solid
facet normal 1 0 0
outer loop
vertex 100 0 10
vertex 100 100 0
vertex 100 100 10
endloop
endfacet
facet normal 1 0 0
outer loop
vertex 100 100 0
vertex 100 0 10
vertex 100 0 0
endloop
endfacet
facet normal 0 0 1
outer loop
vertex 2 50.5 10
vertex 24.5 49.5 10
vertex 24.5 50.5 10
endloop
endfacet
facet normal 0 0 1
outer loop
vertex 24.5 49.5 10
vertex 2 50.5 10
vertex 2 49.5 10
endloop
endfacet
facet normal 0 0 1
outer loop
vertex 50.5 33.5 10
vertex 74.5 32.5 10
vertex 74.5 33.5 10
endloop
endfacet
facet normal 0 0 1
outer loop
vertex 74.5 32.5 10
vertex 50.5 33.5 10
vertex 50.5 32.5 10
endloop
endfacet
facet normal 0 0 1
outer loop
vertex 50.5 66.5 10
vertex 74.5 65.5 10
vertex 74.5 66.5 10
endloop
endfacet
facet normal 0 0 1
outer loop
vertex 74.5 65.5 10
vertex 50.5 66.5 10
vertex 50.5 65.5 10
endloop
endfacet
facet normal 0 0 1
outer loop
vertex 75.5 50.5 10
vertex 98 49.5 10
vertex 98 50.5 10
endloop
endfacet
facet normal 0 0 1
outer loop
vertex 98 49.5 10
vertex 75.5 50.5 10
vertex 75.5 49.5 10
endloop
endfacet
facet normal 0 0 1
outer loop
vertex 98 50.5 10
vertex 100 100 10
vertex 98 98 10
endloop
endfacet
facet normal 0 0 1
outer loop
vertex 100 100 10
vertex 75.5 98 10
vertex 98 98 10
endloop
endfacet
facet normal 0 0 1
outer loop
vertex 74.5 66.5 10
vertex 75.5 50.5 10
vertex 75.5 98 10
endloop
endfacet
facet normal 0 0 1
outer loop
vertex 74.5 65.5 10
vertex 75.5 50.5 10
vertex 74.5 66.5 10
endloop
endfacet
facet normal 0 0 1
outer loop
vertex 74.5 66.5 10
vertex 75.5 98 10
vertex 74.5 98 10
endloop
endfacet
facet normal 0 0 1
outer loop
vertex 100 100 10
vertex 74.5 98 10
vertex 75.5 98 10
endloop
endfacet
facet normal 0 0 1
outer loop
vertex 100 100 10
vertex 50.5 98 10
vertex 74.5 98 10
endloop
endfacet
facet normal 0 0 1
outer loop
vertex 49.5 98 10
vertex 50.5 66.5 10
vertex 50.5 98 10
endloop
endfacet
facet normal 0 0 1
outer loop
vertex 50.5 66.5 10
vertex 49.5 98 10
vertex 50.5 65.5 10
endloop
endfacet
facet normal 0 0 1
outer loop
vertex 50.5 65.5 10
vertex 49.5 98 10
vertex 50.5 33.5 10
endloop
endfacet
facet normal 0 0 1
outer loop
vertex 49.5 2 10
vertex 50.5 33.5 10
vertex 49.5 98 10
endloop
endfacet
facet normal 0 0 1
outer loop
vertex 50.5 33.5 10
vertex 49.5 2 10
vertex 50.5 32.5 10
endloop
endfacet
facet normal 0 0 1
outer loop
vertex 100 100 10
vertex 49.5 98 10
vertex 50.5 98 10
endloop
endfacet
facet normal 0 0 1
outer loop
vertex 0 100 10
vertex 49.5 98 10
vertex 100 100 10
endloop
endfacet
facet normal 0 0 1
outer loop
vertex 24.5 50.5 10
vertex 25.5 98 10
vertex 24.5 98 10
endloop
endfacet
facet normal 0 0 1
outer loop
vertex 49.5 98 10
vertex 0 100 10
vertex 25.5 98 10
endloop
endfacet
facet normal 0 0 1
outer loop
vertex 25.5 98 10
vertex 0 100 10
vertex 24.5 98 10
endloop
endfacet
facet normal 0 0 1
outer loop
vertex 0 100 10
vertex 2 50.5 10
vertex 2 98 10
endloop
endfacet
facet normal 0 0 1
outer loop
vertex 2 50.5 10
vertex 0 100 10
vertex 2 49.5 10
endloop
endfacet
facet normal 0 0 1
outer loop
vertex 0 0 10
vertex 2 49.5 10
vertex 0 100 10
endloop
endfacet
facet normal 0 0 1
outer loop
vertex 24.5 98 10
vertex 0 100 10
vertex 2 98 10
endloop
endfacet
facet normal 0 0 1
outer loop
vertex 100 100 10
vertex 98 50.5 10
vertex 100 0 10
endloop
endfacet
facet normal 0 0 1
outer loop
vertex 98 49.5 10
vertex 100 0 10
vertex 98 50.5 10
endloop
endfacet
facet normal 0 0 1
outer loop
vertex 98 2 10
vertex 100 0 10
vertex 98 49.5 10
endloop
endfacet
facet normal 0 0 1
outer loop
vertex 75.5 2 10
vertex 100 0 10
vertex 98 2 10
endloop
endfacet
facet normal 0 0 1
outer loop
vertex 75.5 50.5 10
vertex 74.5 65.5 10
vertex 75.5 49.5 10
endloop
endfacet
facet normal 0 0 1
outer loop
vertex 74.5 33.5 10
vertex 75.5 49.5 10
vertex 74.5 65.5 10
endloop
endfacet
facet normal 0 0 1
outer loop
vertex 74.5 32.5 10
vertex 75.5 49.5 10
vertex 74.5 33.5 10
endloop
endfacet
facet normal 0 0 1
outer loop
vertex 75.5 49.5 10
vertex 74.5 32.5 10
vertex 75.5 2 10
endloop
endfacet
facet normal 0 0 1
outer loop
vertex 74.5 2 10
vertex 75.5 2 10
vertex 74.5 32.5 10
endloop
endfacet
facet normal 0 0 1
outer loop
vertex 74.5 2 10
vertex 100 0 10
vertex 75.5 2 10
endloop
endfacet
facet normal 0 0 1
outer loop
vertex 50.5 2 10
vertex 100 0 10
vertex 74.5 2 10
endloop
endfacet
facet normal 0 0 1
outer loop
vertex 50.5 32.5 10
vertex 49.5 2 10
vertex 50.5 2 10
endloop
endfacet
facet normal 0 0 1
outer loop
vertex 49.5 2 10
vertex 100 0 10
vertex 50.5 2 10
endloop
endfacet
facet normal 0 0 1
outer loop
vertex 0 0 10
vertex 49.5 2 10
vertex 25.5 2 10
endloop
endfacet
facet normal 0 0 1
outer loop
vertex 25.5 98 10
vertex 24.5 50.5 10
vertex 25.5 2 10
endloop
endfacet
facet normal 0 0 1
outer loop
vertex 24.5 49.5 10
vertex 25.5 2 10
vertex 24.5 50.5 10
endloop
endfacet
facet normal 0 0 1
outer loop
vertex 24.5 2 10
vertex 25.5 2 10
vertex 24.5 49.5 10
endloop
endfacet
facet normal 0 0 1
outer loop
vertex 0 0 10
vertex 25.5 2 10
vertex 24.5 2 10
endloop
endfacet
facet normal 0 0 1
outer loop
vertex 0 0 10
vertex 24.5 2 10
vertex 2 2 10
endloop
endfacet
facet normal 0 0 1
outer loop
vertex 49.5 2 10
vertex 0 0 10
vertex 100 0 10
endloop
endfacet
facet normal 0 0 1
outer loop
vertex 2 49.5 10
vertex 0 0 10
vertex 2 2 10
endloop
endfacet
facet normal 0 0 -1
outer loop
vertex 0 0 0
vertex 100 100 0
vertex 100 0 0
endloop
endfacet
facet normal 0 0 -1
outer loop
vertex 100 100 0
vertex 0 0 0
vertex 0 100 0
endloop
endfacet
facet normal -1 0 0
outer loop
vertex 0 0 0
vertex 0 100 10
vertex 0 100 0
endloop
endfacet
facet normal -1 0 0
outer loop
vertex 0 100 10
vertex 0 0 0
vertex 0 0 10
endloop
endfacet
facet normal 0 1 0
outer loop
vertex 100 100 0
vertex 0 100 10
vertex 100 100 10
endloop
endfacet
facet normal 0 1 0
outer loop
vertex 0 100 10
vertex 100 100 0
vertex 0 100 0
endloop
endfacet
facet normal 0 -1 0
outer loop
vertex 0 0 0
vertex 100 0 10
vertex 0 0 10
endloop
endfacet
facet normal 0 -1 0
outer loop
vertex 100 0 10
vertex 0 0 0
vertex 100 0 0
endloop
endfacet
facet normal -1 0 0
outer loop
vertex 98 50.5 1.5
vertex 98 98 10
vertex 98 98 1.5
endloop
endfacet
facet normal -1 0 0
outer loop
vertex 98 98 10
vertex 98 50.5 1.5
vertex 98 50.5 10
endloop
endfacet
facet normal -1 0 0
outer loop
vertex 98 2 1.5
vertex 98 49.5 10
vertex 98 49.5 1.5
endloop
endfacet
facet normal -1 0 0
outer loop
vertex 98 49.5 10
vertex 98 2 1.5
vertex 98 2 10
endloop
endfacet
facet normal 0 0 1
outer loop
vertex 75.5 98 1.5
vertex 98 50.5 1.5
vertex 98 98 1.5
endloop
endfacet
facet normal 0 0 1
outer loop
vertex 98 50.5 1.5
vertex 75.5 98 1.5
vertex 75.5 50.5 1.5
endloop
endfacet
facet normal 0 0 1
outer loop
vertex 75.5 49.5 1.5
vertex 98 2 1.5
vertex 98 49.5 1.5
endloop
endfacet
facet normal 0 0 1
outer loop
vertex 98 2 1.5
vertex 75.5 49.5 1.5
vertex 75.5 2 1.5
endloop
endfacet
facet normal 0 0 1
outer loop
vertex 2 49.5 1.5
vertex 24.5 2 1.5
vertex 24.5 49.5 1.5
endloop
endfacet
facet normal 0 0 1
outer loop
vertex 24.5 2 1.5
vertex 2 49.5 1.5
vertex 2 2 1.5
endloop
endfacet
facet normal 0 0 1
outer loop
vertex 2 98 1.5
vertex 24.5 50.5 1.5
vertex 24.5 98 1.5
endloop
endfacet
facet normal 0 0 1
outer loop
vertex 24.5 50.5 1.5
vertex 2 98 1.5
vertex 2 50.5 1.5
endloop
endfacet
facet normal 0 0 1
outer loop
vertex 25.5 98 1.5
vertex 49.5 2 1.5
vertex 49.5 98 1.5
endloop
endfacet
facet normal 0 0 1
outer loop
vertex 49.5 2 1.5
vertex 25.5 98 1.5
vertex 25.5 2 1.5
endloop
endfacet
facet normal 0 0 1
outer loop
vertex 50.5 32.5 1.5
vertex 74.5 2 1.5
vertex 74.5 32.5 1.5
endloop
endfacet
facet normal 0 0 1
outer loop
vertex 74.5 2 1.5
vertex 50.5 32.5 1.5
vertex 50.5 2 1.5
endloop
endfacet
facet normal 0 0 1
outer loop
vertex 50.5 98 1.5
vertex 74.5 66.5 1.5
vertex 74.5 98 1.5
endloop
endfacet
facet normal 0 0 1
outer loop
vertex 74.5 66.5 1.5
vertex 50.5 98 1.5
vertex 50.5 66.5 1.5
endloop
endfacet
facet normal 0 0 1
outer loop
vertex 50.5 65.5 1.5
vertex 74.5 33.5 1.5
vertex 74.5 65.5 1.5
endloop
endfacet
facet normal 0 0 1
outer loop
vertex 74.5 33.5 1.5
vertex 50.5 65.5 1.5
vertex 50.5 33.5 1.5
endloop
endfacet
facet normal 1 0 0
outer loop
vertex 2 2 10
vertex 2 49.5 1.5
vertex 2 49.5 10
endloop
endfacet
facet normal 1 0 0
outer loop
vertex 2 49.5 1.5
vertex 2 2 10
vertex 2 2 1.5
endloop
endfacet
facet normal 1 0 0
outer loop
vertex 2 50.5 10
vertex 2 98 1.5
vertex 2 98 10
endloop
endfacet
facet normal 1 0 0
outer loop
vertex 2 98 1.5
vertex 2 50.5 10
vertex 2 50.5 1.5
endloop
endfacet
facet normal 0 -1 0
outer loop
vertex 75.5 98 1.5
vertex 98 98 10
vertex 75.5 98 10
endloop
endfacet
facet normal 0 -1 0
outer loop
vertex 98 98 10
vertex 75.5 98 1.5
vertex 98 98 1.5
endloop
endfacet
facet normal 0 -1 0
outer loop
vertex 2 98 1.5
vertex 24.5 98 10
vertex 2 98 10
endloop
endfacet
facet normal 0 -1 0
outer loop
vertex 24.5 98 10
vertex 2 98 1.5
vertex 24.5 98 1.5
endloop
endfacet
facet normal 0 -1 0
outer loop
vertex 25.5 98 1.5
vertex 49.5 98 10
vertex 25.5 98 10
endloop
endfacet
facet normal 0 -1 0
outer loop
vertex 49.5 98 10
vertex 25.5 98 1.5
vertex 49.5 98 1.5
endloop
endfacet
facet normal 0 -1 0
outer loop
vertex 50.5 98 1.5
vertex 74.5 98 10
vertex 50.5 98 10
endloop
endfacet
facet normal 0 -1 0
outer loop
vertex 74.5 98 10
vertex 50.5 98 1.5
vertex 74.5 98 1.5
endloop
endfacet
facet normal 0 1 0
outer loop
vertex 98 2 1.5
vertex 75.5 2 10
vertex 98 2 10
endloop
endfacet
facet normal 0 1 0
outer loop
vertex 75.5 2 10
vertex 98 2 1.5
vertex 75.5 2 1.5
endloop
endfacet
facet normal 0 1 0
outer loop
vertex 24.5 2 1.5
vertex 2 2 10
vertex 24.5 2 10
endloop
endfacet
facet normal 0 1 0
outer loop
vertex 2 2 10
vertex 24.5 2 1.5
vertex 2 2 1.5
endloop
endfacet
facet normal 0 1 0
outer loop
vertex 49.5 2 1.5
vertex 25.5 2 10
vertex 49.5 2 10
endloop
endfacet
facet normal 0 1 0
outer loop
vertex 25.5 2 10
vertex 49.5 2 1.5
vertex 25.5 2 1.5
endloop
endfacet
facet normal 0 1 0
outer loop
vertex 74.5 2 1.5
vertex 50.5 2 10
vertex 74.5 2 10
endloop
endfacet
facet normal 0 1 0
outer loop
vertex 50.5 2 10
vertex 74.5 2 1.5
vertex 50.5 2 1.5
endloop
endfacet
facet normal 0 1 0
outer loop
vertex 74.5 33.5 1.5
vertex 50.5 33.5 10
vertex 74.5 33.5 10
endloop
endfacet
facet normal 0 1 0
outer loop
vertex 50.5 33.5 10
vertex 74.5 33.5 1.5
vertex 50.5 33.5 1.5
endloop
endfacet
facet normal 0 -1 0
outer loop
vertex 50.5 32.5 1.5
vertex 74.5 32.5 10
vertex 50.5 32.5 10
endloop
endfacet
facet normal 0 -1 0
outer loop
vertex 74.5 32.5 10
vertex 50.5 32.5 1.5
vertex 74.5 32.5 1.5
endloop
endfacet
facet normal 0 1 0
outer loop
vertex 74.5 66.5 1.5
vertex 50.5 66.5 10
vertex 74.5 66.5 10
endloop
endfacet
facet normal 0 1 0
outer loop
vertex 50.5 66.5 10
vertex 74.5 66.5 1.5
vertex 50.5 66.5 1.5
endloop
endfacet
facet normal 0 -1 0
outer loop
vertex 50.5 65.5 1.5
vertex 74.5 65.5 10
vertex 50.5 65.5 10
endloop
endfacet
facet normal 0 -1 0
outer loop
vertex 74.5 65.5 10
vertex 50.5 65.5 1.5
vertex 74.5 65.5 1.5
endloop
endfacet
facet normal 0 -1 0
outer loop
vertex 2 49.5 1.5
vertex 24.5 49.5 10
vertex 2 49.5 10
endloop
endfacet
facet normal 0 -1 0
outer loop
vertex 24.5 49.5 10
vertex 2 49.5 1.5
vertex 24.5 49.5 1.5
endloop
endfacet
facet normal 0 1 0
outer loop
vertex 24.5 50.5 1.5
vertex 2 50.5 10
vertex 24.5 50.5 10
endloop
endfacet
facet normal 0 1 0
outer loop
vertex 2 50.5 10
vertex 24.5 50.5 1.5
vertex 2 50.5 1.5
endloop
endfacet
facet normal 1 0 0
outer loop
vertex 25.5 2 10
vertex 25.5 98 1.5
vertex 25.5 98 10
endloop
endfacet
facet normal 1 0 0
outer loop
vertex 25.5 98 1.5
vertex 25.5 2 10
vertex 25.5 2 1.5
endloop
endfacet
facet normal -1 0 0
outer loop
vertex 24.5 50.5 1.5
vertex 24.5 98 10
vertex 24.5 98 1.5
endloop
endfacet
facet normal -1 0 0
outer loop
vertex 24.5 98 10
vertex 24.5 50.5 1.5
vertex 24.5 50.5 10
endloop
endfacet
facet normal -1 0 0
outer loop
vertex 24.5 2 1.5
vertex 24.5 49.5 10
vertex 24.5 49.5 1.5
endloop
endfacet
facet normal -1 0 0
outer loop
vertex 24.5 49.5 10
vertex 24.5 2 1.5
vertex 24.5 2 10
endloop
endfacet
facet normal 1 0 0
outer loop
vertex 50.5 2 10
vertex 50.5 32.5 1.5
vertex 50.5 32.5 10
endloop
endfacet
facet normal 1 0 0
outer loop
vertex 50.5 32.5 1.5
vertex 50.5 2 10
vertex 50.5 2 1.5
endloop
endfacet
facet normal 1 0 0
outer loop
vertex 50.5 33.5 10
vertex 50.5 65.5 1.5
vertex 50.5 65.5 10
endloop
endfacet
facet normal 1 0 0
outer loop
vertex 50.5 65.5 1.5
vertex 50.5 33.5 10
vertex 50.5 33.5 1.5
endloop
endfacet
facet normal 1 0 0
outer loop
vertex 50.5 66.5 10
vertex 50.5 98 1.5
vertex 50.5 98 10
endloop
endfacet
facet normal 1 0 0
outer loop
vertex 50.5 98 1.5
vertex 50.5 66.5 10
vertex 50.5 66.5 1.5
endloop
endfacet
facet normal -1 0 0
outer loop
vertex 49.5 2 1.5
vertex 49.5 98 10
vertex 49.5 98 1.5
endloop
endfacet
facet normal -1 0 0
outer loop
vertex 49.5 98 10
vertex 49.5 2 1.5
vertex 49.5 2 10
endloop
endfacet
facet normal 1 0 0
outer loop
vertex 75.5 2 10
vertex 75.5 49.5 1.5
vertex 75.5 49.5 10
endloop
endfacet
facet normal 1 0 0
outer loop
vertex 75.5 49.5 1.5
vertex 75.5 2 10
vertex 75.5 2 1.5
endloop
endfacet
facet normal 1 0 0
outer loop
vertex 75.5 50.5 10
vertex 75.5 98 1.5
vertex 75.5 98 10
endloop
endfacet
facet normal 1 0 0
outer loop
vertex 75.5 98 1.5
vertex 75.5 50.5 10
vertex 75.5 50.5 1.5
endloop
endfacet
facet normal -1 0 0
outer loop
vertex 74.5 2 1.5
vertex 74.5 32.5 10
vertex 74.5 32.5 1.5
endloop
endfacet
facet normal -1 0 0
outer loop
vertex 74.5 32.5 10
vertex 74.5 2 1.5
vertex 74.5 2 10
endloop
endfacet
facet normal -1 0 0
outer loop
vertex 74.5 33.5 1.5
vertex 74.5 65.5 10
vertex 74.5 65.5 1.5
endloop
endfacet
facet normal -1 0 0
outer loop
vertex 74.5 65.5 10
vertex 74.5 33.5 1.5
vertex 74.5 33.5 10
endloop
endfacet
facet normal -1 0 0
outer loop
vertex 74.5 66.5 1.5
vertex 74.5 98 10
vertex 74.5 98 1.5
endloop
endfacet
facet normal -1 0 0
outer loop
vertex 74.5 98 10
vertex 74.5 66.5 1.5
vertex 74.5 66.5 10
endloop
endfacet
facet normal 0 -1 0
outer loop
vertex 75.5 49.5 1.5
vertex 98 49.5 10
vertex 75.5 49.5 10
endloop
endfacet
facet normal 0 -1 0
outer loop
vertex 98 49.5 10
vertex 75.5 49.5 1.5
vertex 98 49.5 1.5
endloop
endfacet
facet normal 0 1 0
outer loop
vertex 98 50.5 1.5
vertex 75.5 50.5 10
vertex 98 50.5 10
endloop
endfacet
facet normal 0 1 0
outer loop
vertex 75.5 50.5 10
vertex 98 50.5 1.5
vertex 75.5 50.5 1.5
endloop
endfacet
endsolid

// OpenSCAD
module dividers(div, size, thickness) {
  // div: an array of divider positions (centers), must be increasing.
  //      Nested arrays will alter direction from +x to +y, or +y to +x.
  // size: a 3 component vector
  // thickness: thickness of each wall

  for (i = [0:len(div)-1]) {
    if (len(div[i])) {
      // Handle nested dividers by flipping direction.
      assign (start = i > 0 ? div[i-1] : 0,
              end = i < len(div)-1 ? div[i+1] : size[0]) {
        translate([start, 0, 0])
        multmatrix([[0, 1, 0, 0],
                    [1, 0, 0, 0],
                    [0, 0, 1, 0],
                    [0, 0, 0, 1]])
        dividers(div[i], [size[1], end - start, size[2]], thickness);
      }
    } else {
      translate([div[i]-thickness/2, 0, 0]) cube([thickness, size[1], size[2]]);
    }
  }
}

module divided_box(div, size, to=2, tb=1.5, ti=1) {
  // div:  see dividers()
  // size: outside dimensions of the box
  // to:   thickness of outsize wall
  // tb:   thickness of bottom
  // ti:   thickness of inside wall
  difference() {
    cube(size);
    translate([to, to, tb]) cube(size - [2*to, 2*to, 0]);
  }
  dividers(div, size, ti);
}

divided_box([[50], 25, 50, [33, 66], 75, [50]], [100, 100, 10]);
